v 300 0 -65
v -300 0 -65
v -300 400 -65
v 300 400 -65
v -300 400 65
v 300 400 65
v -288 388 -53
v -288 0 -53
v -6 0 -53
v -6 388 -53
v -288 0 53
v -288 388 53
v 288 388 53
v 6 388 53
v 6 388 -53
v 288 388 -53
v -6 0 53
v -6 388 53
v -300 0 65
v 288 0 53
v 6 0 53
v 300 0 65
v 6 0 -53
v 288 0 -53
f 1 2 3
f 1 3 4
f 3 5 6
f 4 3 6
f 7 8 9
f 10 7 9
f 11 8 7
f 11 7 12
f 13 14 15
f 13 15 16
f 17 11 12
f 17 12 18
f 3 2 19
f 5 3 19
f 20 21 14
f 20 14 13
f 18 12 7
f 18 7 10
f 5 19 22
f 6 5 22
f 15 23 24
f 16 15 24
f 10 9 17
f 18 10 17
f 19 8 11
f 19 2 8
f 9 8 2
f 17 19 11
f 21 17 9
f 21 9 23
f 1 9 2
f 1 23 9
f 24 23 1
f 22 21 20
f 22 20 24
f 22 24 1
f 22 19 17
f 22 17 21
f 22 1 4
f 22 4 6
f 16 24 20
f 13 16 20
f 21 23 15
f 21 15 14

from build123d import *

# Parameters (mm, degrees)
F0_W     = 600
F0_H     = 130
F1_DEPTH = 400
F2_T     = -12
F3_W     = 12
F3_H     = 106
F4_DEPTH = 400


with BuildPart() as f1:
    # F0 (on Front) → F1 (new body)
    with BuildSketch(Plane.XZ):
        Rectangle(F0_W, F0_H)
    extrude(amount=-F1_DEPTH)

    # F2
    f2_openings = [f1.faces().sort_by_distance(p)[0] for p in [
        (0, 0, 0),
    ]]
    offset(amount=F2_T, openings=f2_openings)

    # F3 (on face) → F4 (join)
    with BuildSketch(Plane.XZ):
        Rectangle(F3_W, F3_H)
    extrude(amount=-F4_DEPTH)


solid = f1.part
